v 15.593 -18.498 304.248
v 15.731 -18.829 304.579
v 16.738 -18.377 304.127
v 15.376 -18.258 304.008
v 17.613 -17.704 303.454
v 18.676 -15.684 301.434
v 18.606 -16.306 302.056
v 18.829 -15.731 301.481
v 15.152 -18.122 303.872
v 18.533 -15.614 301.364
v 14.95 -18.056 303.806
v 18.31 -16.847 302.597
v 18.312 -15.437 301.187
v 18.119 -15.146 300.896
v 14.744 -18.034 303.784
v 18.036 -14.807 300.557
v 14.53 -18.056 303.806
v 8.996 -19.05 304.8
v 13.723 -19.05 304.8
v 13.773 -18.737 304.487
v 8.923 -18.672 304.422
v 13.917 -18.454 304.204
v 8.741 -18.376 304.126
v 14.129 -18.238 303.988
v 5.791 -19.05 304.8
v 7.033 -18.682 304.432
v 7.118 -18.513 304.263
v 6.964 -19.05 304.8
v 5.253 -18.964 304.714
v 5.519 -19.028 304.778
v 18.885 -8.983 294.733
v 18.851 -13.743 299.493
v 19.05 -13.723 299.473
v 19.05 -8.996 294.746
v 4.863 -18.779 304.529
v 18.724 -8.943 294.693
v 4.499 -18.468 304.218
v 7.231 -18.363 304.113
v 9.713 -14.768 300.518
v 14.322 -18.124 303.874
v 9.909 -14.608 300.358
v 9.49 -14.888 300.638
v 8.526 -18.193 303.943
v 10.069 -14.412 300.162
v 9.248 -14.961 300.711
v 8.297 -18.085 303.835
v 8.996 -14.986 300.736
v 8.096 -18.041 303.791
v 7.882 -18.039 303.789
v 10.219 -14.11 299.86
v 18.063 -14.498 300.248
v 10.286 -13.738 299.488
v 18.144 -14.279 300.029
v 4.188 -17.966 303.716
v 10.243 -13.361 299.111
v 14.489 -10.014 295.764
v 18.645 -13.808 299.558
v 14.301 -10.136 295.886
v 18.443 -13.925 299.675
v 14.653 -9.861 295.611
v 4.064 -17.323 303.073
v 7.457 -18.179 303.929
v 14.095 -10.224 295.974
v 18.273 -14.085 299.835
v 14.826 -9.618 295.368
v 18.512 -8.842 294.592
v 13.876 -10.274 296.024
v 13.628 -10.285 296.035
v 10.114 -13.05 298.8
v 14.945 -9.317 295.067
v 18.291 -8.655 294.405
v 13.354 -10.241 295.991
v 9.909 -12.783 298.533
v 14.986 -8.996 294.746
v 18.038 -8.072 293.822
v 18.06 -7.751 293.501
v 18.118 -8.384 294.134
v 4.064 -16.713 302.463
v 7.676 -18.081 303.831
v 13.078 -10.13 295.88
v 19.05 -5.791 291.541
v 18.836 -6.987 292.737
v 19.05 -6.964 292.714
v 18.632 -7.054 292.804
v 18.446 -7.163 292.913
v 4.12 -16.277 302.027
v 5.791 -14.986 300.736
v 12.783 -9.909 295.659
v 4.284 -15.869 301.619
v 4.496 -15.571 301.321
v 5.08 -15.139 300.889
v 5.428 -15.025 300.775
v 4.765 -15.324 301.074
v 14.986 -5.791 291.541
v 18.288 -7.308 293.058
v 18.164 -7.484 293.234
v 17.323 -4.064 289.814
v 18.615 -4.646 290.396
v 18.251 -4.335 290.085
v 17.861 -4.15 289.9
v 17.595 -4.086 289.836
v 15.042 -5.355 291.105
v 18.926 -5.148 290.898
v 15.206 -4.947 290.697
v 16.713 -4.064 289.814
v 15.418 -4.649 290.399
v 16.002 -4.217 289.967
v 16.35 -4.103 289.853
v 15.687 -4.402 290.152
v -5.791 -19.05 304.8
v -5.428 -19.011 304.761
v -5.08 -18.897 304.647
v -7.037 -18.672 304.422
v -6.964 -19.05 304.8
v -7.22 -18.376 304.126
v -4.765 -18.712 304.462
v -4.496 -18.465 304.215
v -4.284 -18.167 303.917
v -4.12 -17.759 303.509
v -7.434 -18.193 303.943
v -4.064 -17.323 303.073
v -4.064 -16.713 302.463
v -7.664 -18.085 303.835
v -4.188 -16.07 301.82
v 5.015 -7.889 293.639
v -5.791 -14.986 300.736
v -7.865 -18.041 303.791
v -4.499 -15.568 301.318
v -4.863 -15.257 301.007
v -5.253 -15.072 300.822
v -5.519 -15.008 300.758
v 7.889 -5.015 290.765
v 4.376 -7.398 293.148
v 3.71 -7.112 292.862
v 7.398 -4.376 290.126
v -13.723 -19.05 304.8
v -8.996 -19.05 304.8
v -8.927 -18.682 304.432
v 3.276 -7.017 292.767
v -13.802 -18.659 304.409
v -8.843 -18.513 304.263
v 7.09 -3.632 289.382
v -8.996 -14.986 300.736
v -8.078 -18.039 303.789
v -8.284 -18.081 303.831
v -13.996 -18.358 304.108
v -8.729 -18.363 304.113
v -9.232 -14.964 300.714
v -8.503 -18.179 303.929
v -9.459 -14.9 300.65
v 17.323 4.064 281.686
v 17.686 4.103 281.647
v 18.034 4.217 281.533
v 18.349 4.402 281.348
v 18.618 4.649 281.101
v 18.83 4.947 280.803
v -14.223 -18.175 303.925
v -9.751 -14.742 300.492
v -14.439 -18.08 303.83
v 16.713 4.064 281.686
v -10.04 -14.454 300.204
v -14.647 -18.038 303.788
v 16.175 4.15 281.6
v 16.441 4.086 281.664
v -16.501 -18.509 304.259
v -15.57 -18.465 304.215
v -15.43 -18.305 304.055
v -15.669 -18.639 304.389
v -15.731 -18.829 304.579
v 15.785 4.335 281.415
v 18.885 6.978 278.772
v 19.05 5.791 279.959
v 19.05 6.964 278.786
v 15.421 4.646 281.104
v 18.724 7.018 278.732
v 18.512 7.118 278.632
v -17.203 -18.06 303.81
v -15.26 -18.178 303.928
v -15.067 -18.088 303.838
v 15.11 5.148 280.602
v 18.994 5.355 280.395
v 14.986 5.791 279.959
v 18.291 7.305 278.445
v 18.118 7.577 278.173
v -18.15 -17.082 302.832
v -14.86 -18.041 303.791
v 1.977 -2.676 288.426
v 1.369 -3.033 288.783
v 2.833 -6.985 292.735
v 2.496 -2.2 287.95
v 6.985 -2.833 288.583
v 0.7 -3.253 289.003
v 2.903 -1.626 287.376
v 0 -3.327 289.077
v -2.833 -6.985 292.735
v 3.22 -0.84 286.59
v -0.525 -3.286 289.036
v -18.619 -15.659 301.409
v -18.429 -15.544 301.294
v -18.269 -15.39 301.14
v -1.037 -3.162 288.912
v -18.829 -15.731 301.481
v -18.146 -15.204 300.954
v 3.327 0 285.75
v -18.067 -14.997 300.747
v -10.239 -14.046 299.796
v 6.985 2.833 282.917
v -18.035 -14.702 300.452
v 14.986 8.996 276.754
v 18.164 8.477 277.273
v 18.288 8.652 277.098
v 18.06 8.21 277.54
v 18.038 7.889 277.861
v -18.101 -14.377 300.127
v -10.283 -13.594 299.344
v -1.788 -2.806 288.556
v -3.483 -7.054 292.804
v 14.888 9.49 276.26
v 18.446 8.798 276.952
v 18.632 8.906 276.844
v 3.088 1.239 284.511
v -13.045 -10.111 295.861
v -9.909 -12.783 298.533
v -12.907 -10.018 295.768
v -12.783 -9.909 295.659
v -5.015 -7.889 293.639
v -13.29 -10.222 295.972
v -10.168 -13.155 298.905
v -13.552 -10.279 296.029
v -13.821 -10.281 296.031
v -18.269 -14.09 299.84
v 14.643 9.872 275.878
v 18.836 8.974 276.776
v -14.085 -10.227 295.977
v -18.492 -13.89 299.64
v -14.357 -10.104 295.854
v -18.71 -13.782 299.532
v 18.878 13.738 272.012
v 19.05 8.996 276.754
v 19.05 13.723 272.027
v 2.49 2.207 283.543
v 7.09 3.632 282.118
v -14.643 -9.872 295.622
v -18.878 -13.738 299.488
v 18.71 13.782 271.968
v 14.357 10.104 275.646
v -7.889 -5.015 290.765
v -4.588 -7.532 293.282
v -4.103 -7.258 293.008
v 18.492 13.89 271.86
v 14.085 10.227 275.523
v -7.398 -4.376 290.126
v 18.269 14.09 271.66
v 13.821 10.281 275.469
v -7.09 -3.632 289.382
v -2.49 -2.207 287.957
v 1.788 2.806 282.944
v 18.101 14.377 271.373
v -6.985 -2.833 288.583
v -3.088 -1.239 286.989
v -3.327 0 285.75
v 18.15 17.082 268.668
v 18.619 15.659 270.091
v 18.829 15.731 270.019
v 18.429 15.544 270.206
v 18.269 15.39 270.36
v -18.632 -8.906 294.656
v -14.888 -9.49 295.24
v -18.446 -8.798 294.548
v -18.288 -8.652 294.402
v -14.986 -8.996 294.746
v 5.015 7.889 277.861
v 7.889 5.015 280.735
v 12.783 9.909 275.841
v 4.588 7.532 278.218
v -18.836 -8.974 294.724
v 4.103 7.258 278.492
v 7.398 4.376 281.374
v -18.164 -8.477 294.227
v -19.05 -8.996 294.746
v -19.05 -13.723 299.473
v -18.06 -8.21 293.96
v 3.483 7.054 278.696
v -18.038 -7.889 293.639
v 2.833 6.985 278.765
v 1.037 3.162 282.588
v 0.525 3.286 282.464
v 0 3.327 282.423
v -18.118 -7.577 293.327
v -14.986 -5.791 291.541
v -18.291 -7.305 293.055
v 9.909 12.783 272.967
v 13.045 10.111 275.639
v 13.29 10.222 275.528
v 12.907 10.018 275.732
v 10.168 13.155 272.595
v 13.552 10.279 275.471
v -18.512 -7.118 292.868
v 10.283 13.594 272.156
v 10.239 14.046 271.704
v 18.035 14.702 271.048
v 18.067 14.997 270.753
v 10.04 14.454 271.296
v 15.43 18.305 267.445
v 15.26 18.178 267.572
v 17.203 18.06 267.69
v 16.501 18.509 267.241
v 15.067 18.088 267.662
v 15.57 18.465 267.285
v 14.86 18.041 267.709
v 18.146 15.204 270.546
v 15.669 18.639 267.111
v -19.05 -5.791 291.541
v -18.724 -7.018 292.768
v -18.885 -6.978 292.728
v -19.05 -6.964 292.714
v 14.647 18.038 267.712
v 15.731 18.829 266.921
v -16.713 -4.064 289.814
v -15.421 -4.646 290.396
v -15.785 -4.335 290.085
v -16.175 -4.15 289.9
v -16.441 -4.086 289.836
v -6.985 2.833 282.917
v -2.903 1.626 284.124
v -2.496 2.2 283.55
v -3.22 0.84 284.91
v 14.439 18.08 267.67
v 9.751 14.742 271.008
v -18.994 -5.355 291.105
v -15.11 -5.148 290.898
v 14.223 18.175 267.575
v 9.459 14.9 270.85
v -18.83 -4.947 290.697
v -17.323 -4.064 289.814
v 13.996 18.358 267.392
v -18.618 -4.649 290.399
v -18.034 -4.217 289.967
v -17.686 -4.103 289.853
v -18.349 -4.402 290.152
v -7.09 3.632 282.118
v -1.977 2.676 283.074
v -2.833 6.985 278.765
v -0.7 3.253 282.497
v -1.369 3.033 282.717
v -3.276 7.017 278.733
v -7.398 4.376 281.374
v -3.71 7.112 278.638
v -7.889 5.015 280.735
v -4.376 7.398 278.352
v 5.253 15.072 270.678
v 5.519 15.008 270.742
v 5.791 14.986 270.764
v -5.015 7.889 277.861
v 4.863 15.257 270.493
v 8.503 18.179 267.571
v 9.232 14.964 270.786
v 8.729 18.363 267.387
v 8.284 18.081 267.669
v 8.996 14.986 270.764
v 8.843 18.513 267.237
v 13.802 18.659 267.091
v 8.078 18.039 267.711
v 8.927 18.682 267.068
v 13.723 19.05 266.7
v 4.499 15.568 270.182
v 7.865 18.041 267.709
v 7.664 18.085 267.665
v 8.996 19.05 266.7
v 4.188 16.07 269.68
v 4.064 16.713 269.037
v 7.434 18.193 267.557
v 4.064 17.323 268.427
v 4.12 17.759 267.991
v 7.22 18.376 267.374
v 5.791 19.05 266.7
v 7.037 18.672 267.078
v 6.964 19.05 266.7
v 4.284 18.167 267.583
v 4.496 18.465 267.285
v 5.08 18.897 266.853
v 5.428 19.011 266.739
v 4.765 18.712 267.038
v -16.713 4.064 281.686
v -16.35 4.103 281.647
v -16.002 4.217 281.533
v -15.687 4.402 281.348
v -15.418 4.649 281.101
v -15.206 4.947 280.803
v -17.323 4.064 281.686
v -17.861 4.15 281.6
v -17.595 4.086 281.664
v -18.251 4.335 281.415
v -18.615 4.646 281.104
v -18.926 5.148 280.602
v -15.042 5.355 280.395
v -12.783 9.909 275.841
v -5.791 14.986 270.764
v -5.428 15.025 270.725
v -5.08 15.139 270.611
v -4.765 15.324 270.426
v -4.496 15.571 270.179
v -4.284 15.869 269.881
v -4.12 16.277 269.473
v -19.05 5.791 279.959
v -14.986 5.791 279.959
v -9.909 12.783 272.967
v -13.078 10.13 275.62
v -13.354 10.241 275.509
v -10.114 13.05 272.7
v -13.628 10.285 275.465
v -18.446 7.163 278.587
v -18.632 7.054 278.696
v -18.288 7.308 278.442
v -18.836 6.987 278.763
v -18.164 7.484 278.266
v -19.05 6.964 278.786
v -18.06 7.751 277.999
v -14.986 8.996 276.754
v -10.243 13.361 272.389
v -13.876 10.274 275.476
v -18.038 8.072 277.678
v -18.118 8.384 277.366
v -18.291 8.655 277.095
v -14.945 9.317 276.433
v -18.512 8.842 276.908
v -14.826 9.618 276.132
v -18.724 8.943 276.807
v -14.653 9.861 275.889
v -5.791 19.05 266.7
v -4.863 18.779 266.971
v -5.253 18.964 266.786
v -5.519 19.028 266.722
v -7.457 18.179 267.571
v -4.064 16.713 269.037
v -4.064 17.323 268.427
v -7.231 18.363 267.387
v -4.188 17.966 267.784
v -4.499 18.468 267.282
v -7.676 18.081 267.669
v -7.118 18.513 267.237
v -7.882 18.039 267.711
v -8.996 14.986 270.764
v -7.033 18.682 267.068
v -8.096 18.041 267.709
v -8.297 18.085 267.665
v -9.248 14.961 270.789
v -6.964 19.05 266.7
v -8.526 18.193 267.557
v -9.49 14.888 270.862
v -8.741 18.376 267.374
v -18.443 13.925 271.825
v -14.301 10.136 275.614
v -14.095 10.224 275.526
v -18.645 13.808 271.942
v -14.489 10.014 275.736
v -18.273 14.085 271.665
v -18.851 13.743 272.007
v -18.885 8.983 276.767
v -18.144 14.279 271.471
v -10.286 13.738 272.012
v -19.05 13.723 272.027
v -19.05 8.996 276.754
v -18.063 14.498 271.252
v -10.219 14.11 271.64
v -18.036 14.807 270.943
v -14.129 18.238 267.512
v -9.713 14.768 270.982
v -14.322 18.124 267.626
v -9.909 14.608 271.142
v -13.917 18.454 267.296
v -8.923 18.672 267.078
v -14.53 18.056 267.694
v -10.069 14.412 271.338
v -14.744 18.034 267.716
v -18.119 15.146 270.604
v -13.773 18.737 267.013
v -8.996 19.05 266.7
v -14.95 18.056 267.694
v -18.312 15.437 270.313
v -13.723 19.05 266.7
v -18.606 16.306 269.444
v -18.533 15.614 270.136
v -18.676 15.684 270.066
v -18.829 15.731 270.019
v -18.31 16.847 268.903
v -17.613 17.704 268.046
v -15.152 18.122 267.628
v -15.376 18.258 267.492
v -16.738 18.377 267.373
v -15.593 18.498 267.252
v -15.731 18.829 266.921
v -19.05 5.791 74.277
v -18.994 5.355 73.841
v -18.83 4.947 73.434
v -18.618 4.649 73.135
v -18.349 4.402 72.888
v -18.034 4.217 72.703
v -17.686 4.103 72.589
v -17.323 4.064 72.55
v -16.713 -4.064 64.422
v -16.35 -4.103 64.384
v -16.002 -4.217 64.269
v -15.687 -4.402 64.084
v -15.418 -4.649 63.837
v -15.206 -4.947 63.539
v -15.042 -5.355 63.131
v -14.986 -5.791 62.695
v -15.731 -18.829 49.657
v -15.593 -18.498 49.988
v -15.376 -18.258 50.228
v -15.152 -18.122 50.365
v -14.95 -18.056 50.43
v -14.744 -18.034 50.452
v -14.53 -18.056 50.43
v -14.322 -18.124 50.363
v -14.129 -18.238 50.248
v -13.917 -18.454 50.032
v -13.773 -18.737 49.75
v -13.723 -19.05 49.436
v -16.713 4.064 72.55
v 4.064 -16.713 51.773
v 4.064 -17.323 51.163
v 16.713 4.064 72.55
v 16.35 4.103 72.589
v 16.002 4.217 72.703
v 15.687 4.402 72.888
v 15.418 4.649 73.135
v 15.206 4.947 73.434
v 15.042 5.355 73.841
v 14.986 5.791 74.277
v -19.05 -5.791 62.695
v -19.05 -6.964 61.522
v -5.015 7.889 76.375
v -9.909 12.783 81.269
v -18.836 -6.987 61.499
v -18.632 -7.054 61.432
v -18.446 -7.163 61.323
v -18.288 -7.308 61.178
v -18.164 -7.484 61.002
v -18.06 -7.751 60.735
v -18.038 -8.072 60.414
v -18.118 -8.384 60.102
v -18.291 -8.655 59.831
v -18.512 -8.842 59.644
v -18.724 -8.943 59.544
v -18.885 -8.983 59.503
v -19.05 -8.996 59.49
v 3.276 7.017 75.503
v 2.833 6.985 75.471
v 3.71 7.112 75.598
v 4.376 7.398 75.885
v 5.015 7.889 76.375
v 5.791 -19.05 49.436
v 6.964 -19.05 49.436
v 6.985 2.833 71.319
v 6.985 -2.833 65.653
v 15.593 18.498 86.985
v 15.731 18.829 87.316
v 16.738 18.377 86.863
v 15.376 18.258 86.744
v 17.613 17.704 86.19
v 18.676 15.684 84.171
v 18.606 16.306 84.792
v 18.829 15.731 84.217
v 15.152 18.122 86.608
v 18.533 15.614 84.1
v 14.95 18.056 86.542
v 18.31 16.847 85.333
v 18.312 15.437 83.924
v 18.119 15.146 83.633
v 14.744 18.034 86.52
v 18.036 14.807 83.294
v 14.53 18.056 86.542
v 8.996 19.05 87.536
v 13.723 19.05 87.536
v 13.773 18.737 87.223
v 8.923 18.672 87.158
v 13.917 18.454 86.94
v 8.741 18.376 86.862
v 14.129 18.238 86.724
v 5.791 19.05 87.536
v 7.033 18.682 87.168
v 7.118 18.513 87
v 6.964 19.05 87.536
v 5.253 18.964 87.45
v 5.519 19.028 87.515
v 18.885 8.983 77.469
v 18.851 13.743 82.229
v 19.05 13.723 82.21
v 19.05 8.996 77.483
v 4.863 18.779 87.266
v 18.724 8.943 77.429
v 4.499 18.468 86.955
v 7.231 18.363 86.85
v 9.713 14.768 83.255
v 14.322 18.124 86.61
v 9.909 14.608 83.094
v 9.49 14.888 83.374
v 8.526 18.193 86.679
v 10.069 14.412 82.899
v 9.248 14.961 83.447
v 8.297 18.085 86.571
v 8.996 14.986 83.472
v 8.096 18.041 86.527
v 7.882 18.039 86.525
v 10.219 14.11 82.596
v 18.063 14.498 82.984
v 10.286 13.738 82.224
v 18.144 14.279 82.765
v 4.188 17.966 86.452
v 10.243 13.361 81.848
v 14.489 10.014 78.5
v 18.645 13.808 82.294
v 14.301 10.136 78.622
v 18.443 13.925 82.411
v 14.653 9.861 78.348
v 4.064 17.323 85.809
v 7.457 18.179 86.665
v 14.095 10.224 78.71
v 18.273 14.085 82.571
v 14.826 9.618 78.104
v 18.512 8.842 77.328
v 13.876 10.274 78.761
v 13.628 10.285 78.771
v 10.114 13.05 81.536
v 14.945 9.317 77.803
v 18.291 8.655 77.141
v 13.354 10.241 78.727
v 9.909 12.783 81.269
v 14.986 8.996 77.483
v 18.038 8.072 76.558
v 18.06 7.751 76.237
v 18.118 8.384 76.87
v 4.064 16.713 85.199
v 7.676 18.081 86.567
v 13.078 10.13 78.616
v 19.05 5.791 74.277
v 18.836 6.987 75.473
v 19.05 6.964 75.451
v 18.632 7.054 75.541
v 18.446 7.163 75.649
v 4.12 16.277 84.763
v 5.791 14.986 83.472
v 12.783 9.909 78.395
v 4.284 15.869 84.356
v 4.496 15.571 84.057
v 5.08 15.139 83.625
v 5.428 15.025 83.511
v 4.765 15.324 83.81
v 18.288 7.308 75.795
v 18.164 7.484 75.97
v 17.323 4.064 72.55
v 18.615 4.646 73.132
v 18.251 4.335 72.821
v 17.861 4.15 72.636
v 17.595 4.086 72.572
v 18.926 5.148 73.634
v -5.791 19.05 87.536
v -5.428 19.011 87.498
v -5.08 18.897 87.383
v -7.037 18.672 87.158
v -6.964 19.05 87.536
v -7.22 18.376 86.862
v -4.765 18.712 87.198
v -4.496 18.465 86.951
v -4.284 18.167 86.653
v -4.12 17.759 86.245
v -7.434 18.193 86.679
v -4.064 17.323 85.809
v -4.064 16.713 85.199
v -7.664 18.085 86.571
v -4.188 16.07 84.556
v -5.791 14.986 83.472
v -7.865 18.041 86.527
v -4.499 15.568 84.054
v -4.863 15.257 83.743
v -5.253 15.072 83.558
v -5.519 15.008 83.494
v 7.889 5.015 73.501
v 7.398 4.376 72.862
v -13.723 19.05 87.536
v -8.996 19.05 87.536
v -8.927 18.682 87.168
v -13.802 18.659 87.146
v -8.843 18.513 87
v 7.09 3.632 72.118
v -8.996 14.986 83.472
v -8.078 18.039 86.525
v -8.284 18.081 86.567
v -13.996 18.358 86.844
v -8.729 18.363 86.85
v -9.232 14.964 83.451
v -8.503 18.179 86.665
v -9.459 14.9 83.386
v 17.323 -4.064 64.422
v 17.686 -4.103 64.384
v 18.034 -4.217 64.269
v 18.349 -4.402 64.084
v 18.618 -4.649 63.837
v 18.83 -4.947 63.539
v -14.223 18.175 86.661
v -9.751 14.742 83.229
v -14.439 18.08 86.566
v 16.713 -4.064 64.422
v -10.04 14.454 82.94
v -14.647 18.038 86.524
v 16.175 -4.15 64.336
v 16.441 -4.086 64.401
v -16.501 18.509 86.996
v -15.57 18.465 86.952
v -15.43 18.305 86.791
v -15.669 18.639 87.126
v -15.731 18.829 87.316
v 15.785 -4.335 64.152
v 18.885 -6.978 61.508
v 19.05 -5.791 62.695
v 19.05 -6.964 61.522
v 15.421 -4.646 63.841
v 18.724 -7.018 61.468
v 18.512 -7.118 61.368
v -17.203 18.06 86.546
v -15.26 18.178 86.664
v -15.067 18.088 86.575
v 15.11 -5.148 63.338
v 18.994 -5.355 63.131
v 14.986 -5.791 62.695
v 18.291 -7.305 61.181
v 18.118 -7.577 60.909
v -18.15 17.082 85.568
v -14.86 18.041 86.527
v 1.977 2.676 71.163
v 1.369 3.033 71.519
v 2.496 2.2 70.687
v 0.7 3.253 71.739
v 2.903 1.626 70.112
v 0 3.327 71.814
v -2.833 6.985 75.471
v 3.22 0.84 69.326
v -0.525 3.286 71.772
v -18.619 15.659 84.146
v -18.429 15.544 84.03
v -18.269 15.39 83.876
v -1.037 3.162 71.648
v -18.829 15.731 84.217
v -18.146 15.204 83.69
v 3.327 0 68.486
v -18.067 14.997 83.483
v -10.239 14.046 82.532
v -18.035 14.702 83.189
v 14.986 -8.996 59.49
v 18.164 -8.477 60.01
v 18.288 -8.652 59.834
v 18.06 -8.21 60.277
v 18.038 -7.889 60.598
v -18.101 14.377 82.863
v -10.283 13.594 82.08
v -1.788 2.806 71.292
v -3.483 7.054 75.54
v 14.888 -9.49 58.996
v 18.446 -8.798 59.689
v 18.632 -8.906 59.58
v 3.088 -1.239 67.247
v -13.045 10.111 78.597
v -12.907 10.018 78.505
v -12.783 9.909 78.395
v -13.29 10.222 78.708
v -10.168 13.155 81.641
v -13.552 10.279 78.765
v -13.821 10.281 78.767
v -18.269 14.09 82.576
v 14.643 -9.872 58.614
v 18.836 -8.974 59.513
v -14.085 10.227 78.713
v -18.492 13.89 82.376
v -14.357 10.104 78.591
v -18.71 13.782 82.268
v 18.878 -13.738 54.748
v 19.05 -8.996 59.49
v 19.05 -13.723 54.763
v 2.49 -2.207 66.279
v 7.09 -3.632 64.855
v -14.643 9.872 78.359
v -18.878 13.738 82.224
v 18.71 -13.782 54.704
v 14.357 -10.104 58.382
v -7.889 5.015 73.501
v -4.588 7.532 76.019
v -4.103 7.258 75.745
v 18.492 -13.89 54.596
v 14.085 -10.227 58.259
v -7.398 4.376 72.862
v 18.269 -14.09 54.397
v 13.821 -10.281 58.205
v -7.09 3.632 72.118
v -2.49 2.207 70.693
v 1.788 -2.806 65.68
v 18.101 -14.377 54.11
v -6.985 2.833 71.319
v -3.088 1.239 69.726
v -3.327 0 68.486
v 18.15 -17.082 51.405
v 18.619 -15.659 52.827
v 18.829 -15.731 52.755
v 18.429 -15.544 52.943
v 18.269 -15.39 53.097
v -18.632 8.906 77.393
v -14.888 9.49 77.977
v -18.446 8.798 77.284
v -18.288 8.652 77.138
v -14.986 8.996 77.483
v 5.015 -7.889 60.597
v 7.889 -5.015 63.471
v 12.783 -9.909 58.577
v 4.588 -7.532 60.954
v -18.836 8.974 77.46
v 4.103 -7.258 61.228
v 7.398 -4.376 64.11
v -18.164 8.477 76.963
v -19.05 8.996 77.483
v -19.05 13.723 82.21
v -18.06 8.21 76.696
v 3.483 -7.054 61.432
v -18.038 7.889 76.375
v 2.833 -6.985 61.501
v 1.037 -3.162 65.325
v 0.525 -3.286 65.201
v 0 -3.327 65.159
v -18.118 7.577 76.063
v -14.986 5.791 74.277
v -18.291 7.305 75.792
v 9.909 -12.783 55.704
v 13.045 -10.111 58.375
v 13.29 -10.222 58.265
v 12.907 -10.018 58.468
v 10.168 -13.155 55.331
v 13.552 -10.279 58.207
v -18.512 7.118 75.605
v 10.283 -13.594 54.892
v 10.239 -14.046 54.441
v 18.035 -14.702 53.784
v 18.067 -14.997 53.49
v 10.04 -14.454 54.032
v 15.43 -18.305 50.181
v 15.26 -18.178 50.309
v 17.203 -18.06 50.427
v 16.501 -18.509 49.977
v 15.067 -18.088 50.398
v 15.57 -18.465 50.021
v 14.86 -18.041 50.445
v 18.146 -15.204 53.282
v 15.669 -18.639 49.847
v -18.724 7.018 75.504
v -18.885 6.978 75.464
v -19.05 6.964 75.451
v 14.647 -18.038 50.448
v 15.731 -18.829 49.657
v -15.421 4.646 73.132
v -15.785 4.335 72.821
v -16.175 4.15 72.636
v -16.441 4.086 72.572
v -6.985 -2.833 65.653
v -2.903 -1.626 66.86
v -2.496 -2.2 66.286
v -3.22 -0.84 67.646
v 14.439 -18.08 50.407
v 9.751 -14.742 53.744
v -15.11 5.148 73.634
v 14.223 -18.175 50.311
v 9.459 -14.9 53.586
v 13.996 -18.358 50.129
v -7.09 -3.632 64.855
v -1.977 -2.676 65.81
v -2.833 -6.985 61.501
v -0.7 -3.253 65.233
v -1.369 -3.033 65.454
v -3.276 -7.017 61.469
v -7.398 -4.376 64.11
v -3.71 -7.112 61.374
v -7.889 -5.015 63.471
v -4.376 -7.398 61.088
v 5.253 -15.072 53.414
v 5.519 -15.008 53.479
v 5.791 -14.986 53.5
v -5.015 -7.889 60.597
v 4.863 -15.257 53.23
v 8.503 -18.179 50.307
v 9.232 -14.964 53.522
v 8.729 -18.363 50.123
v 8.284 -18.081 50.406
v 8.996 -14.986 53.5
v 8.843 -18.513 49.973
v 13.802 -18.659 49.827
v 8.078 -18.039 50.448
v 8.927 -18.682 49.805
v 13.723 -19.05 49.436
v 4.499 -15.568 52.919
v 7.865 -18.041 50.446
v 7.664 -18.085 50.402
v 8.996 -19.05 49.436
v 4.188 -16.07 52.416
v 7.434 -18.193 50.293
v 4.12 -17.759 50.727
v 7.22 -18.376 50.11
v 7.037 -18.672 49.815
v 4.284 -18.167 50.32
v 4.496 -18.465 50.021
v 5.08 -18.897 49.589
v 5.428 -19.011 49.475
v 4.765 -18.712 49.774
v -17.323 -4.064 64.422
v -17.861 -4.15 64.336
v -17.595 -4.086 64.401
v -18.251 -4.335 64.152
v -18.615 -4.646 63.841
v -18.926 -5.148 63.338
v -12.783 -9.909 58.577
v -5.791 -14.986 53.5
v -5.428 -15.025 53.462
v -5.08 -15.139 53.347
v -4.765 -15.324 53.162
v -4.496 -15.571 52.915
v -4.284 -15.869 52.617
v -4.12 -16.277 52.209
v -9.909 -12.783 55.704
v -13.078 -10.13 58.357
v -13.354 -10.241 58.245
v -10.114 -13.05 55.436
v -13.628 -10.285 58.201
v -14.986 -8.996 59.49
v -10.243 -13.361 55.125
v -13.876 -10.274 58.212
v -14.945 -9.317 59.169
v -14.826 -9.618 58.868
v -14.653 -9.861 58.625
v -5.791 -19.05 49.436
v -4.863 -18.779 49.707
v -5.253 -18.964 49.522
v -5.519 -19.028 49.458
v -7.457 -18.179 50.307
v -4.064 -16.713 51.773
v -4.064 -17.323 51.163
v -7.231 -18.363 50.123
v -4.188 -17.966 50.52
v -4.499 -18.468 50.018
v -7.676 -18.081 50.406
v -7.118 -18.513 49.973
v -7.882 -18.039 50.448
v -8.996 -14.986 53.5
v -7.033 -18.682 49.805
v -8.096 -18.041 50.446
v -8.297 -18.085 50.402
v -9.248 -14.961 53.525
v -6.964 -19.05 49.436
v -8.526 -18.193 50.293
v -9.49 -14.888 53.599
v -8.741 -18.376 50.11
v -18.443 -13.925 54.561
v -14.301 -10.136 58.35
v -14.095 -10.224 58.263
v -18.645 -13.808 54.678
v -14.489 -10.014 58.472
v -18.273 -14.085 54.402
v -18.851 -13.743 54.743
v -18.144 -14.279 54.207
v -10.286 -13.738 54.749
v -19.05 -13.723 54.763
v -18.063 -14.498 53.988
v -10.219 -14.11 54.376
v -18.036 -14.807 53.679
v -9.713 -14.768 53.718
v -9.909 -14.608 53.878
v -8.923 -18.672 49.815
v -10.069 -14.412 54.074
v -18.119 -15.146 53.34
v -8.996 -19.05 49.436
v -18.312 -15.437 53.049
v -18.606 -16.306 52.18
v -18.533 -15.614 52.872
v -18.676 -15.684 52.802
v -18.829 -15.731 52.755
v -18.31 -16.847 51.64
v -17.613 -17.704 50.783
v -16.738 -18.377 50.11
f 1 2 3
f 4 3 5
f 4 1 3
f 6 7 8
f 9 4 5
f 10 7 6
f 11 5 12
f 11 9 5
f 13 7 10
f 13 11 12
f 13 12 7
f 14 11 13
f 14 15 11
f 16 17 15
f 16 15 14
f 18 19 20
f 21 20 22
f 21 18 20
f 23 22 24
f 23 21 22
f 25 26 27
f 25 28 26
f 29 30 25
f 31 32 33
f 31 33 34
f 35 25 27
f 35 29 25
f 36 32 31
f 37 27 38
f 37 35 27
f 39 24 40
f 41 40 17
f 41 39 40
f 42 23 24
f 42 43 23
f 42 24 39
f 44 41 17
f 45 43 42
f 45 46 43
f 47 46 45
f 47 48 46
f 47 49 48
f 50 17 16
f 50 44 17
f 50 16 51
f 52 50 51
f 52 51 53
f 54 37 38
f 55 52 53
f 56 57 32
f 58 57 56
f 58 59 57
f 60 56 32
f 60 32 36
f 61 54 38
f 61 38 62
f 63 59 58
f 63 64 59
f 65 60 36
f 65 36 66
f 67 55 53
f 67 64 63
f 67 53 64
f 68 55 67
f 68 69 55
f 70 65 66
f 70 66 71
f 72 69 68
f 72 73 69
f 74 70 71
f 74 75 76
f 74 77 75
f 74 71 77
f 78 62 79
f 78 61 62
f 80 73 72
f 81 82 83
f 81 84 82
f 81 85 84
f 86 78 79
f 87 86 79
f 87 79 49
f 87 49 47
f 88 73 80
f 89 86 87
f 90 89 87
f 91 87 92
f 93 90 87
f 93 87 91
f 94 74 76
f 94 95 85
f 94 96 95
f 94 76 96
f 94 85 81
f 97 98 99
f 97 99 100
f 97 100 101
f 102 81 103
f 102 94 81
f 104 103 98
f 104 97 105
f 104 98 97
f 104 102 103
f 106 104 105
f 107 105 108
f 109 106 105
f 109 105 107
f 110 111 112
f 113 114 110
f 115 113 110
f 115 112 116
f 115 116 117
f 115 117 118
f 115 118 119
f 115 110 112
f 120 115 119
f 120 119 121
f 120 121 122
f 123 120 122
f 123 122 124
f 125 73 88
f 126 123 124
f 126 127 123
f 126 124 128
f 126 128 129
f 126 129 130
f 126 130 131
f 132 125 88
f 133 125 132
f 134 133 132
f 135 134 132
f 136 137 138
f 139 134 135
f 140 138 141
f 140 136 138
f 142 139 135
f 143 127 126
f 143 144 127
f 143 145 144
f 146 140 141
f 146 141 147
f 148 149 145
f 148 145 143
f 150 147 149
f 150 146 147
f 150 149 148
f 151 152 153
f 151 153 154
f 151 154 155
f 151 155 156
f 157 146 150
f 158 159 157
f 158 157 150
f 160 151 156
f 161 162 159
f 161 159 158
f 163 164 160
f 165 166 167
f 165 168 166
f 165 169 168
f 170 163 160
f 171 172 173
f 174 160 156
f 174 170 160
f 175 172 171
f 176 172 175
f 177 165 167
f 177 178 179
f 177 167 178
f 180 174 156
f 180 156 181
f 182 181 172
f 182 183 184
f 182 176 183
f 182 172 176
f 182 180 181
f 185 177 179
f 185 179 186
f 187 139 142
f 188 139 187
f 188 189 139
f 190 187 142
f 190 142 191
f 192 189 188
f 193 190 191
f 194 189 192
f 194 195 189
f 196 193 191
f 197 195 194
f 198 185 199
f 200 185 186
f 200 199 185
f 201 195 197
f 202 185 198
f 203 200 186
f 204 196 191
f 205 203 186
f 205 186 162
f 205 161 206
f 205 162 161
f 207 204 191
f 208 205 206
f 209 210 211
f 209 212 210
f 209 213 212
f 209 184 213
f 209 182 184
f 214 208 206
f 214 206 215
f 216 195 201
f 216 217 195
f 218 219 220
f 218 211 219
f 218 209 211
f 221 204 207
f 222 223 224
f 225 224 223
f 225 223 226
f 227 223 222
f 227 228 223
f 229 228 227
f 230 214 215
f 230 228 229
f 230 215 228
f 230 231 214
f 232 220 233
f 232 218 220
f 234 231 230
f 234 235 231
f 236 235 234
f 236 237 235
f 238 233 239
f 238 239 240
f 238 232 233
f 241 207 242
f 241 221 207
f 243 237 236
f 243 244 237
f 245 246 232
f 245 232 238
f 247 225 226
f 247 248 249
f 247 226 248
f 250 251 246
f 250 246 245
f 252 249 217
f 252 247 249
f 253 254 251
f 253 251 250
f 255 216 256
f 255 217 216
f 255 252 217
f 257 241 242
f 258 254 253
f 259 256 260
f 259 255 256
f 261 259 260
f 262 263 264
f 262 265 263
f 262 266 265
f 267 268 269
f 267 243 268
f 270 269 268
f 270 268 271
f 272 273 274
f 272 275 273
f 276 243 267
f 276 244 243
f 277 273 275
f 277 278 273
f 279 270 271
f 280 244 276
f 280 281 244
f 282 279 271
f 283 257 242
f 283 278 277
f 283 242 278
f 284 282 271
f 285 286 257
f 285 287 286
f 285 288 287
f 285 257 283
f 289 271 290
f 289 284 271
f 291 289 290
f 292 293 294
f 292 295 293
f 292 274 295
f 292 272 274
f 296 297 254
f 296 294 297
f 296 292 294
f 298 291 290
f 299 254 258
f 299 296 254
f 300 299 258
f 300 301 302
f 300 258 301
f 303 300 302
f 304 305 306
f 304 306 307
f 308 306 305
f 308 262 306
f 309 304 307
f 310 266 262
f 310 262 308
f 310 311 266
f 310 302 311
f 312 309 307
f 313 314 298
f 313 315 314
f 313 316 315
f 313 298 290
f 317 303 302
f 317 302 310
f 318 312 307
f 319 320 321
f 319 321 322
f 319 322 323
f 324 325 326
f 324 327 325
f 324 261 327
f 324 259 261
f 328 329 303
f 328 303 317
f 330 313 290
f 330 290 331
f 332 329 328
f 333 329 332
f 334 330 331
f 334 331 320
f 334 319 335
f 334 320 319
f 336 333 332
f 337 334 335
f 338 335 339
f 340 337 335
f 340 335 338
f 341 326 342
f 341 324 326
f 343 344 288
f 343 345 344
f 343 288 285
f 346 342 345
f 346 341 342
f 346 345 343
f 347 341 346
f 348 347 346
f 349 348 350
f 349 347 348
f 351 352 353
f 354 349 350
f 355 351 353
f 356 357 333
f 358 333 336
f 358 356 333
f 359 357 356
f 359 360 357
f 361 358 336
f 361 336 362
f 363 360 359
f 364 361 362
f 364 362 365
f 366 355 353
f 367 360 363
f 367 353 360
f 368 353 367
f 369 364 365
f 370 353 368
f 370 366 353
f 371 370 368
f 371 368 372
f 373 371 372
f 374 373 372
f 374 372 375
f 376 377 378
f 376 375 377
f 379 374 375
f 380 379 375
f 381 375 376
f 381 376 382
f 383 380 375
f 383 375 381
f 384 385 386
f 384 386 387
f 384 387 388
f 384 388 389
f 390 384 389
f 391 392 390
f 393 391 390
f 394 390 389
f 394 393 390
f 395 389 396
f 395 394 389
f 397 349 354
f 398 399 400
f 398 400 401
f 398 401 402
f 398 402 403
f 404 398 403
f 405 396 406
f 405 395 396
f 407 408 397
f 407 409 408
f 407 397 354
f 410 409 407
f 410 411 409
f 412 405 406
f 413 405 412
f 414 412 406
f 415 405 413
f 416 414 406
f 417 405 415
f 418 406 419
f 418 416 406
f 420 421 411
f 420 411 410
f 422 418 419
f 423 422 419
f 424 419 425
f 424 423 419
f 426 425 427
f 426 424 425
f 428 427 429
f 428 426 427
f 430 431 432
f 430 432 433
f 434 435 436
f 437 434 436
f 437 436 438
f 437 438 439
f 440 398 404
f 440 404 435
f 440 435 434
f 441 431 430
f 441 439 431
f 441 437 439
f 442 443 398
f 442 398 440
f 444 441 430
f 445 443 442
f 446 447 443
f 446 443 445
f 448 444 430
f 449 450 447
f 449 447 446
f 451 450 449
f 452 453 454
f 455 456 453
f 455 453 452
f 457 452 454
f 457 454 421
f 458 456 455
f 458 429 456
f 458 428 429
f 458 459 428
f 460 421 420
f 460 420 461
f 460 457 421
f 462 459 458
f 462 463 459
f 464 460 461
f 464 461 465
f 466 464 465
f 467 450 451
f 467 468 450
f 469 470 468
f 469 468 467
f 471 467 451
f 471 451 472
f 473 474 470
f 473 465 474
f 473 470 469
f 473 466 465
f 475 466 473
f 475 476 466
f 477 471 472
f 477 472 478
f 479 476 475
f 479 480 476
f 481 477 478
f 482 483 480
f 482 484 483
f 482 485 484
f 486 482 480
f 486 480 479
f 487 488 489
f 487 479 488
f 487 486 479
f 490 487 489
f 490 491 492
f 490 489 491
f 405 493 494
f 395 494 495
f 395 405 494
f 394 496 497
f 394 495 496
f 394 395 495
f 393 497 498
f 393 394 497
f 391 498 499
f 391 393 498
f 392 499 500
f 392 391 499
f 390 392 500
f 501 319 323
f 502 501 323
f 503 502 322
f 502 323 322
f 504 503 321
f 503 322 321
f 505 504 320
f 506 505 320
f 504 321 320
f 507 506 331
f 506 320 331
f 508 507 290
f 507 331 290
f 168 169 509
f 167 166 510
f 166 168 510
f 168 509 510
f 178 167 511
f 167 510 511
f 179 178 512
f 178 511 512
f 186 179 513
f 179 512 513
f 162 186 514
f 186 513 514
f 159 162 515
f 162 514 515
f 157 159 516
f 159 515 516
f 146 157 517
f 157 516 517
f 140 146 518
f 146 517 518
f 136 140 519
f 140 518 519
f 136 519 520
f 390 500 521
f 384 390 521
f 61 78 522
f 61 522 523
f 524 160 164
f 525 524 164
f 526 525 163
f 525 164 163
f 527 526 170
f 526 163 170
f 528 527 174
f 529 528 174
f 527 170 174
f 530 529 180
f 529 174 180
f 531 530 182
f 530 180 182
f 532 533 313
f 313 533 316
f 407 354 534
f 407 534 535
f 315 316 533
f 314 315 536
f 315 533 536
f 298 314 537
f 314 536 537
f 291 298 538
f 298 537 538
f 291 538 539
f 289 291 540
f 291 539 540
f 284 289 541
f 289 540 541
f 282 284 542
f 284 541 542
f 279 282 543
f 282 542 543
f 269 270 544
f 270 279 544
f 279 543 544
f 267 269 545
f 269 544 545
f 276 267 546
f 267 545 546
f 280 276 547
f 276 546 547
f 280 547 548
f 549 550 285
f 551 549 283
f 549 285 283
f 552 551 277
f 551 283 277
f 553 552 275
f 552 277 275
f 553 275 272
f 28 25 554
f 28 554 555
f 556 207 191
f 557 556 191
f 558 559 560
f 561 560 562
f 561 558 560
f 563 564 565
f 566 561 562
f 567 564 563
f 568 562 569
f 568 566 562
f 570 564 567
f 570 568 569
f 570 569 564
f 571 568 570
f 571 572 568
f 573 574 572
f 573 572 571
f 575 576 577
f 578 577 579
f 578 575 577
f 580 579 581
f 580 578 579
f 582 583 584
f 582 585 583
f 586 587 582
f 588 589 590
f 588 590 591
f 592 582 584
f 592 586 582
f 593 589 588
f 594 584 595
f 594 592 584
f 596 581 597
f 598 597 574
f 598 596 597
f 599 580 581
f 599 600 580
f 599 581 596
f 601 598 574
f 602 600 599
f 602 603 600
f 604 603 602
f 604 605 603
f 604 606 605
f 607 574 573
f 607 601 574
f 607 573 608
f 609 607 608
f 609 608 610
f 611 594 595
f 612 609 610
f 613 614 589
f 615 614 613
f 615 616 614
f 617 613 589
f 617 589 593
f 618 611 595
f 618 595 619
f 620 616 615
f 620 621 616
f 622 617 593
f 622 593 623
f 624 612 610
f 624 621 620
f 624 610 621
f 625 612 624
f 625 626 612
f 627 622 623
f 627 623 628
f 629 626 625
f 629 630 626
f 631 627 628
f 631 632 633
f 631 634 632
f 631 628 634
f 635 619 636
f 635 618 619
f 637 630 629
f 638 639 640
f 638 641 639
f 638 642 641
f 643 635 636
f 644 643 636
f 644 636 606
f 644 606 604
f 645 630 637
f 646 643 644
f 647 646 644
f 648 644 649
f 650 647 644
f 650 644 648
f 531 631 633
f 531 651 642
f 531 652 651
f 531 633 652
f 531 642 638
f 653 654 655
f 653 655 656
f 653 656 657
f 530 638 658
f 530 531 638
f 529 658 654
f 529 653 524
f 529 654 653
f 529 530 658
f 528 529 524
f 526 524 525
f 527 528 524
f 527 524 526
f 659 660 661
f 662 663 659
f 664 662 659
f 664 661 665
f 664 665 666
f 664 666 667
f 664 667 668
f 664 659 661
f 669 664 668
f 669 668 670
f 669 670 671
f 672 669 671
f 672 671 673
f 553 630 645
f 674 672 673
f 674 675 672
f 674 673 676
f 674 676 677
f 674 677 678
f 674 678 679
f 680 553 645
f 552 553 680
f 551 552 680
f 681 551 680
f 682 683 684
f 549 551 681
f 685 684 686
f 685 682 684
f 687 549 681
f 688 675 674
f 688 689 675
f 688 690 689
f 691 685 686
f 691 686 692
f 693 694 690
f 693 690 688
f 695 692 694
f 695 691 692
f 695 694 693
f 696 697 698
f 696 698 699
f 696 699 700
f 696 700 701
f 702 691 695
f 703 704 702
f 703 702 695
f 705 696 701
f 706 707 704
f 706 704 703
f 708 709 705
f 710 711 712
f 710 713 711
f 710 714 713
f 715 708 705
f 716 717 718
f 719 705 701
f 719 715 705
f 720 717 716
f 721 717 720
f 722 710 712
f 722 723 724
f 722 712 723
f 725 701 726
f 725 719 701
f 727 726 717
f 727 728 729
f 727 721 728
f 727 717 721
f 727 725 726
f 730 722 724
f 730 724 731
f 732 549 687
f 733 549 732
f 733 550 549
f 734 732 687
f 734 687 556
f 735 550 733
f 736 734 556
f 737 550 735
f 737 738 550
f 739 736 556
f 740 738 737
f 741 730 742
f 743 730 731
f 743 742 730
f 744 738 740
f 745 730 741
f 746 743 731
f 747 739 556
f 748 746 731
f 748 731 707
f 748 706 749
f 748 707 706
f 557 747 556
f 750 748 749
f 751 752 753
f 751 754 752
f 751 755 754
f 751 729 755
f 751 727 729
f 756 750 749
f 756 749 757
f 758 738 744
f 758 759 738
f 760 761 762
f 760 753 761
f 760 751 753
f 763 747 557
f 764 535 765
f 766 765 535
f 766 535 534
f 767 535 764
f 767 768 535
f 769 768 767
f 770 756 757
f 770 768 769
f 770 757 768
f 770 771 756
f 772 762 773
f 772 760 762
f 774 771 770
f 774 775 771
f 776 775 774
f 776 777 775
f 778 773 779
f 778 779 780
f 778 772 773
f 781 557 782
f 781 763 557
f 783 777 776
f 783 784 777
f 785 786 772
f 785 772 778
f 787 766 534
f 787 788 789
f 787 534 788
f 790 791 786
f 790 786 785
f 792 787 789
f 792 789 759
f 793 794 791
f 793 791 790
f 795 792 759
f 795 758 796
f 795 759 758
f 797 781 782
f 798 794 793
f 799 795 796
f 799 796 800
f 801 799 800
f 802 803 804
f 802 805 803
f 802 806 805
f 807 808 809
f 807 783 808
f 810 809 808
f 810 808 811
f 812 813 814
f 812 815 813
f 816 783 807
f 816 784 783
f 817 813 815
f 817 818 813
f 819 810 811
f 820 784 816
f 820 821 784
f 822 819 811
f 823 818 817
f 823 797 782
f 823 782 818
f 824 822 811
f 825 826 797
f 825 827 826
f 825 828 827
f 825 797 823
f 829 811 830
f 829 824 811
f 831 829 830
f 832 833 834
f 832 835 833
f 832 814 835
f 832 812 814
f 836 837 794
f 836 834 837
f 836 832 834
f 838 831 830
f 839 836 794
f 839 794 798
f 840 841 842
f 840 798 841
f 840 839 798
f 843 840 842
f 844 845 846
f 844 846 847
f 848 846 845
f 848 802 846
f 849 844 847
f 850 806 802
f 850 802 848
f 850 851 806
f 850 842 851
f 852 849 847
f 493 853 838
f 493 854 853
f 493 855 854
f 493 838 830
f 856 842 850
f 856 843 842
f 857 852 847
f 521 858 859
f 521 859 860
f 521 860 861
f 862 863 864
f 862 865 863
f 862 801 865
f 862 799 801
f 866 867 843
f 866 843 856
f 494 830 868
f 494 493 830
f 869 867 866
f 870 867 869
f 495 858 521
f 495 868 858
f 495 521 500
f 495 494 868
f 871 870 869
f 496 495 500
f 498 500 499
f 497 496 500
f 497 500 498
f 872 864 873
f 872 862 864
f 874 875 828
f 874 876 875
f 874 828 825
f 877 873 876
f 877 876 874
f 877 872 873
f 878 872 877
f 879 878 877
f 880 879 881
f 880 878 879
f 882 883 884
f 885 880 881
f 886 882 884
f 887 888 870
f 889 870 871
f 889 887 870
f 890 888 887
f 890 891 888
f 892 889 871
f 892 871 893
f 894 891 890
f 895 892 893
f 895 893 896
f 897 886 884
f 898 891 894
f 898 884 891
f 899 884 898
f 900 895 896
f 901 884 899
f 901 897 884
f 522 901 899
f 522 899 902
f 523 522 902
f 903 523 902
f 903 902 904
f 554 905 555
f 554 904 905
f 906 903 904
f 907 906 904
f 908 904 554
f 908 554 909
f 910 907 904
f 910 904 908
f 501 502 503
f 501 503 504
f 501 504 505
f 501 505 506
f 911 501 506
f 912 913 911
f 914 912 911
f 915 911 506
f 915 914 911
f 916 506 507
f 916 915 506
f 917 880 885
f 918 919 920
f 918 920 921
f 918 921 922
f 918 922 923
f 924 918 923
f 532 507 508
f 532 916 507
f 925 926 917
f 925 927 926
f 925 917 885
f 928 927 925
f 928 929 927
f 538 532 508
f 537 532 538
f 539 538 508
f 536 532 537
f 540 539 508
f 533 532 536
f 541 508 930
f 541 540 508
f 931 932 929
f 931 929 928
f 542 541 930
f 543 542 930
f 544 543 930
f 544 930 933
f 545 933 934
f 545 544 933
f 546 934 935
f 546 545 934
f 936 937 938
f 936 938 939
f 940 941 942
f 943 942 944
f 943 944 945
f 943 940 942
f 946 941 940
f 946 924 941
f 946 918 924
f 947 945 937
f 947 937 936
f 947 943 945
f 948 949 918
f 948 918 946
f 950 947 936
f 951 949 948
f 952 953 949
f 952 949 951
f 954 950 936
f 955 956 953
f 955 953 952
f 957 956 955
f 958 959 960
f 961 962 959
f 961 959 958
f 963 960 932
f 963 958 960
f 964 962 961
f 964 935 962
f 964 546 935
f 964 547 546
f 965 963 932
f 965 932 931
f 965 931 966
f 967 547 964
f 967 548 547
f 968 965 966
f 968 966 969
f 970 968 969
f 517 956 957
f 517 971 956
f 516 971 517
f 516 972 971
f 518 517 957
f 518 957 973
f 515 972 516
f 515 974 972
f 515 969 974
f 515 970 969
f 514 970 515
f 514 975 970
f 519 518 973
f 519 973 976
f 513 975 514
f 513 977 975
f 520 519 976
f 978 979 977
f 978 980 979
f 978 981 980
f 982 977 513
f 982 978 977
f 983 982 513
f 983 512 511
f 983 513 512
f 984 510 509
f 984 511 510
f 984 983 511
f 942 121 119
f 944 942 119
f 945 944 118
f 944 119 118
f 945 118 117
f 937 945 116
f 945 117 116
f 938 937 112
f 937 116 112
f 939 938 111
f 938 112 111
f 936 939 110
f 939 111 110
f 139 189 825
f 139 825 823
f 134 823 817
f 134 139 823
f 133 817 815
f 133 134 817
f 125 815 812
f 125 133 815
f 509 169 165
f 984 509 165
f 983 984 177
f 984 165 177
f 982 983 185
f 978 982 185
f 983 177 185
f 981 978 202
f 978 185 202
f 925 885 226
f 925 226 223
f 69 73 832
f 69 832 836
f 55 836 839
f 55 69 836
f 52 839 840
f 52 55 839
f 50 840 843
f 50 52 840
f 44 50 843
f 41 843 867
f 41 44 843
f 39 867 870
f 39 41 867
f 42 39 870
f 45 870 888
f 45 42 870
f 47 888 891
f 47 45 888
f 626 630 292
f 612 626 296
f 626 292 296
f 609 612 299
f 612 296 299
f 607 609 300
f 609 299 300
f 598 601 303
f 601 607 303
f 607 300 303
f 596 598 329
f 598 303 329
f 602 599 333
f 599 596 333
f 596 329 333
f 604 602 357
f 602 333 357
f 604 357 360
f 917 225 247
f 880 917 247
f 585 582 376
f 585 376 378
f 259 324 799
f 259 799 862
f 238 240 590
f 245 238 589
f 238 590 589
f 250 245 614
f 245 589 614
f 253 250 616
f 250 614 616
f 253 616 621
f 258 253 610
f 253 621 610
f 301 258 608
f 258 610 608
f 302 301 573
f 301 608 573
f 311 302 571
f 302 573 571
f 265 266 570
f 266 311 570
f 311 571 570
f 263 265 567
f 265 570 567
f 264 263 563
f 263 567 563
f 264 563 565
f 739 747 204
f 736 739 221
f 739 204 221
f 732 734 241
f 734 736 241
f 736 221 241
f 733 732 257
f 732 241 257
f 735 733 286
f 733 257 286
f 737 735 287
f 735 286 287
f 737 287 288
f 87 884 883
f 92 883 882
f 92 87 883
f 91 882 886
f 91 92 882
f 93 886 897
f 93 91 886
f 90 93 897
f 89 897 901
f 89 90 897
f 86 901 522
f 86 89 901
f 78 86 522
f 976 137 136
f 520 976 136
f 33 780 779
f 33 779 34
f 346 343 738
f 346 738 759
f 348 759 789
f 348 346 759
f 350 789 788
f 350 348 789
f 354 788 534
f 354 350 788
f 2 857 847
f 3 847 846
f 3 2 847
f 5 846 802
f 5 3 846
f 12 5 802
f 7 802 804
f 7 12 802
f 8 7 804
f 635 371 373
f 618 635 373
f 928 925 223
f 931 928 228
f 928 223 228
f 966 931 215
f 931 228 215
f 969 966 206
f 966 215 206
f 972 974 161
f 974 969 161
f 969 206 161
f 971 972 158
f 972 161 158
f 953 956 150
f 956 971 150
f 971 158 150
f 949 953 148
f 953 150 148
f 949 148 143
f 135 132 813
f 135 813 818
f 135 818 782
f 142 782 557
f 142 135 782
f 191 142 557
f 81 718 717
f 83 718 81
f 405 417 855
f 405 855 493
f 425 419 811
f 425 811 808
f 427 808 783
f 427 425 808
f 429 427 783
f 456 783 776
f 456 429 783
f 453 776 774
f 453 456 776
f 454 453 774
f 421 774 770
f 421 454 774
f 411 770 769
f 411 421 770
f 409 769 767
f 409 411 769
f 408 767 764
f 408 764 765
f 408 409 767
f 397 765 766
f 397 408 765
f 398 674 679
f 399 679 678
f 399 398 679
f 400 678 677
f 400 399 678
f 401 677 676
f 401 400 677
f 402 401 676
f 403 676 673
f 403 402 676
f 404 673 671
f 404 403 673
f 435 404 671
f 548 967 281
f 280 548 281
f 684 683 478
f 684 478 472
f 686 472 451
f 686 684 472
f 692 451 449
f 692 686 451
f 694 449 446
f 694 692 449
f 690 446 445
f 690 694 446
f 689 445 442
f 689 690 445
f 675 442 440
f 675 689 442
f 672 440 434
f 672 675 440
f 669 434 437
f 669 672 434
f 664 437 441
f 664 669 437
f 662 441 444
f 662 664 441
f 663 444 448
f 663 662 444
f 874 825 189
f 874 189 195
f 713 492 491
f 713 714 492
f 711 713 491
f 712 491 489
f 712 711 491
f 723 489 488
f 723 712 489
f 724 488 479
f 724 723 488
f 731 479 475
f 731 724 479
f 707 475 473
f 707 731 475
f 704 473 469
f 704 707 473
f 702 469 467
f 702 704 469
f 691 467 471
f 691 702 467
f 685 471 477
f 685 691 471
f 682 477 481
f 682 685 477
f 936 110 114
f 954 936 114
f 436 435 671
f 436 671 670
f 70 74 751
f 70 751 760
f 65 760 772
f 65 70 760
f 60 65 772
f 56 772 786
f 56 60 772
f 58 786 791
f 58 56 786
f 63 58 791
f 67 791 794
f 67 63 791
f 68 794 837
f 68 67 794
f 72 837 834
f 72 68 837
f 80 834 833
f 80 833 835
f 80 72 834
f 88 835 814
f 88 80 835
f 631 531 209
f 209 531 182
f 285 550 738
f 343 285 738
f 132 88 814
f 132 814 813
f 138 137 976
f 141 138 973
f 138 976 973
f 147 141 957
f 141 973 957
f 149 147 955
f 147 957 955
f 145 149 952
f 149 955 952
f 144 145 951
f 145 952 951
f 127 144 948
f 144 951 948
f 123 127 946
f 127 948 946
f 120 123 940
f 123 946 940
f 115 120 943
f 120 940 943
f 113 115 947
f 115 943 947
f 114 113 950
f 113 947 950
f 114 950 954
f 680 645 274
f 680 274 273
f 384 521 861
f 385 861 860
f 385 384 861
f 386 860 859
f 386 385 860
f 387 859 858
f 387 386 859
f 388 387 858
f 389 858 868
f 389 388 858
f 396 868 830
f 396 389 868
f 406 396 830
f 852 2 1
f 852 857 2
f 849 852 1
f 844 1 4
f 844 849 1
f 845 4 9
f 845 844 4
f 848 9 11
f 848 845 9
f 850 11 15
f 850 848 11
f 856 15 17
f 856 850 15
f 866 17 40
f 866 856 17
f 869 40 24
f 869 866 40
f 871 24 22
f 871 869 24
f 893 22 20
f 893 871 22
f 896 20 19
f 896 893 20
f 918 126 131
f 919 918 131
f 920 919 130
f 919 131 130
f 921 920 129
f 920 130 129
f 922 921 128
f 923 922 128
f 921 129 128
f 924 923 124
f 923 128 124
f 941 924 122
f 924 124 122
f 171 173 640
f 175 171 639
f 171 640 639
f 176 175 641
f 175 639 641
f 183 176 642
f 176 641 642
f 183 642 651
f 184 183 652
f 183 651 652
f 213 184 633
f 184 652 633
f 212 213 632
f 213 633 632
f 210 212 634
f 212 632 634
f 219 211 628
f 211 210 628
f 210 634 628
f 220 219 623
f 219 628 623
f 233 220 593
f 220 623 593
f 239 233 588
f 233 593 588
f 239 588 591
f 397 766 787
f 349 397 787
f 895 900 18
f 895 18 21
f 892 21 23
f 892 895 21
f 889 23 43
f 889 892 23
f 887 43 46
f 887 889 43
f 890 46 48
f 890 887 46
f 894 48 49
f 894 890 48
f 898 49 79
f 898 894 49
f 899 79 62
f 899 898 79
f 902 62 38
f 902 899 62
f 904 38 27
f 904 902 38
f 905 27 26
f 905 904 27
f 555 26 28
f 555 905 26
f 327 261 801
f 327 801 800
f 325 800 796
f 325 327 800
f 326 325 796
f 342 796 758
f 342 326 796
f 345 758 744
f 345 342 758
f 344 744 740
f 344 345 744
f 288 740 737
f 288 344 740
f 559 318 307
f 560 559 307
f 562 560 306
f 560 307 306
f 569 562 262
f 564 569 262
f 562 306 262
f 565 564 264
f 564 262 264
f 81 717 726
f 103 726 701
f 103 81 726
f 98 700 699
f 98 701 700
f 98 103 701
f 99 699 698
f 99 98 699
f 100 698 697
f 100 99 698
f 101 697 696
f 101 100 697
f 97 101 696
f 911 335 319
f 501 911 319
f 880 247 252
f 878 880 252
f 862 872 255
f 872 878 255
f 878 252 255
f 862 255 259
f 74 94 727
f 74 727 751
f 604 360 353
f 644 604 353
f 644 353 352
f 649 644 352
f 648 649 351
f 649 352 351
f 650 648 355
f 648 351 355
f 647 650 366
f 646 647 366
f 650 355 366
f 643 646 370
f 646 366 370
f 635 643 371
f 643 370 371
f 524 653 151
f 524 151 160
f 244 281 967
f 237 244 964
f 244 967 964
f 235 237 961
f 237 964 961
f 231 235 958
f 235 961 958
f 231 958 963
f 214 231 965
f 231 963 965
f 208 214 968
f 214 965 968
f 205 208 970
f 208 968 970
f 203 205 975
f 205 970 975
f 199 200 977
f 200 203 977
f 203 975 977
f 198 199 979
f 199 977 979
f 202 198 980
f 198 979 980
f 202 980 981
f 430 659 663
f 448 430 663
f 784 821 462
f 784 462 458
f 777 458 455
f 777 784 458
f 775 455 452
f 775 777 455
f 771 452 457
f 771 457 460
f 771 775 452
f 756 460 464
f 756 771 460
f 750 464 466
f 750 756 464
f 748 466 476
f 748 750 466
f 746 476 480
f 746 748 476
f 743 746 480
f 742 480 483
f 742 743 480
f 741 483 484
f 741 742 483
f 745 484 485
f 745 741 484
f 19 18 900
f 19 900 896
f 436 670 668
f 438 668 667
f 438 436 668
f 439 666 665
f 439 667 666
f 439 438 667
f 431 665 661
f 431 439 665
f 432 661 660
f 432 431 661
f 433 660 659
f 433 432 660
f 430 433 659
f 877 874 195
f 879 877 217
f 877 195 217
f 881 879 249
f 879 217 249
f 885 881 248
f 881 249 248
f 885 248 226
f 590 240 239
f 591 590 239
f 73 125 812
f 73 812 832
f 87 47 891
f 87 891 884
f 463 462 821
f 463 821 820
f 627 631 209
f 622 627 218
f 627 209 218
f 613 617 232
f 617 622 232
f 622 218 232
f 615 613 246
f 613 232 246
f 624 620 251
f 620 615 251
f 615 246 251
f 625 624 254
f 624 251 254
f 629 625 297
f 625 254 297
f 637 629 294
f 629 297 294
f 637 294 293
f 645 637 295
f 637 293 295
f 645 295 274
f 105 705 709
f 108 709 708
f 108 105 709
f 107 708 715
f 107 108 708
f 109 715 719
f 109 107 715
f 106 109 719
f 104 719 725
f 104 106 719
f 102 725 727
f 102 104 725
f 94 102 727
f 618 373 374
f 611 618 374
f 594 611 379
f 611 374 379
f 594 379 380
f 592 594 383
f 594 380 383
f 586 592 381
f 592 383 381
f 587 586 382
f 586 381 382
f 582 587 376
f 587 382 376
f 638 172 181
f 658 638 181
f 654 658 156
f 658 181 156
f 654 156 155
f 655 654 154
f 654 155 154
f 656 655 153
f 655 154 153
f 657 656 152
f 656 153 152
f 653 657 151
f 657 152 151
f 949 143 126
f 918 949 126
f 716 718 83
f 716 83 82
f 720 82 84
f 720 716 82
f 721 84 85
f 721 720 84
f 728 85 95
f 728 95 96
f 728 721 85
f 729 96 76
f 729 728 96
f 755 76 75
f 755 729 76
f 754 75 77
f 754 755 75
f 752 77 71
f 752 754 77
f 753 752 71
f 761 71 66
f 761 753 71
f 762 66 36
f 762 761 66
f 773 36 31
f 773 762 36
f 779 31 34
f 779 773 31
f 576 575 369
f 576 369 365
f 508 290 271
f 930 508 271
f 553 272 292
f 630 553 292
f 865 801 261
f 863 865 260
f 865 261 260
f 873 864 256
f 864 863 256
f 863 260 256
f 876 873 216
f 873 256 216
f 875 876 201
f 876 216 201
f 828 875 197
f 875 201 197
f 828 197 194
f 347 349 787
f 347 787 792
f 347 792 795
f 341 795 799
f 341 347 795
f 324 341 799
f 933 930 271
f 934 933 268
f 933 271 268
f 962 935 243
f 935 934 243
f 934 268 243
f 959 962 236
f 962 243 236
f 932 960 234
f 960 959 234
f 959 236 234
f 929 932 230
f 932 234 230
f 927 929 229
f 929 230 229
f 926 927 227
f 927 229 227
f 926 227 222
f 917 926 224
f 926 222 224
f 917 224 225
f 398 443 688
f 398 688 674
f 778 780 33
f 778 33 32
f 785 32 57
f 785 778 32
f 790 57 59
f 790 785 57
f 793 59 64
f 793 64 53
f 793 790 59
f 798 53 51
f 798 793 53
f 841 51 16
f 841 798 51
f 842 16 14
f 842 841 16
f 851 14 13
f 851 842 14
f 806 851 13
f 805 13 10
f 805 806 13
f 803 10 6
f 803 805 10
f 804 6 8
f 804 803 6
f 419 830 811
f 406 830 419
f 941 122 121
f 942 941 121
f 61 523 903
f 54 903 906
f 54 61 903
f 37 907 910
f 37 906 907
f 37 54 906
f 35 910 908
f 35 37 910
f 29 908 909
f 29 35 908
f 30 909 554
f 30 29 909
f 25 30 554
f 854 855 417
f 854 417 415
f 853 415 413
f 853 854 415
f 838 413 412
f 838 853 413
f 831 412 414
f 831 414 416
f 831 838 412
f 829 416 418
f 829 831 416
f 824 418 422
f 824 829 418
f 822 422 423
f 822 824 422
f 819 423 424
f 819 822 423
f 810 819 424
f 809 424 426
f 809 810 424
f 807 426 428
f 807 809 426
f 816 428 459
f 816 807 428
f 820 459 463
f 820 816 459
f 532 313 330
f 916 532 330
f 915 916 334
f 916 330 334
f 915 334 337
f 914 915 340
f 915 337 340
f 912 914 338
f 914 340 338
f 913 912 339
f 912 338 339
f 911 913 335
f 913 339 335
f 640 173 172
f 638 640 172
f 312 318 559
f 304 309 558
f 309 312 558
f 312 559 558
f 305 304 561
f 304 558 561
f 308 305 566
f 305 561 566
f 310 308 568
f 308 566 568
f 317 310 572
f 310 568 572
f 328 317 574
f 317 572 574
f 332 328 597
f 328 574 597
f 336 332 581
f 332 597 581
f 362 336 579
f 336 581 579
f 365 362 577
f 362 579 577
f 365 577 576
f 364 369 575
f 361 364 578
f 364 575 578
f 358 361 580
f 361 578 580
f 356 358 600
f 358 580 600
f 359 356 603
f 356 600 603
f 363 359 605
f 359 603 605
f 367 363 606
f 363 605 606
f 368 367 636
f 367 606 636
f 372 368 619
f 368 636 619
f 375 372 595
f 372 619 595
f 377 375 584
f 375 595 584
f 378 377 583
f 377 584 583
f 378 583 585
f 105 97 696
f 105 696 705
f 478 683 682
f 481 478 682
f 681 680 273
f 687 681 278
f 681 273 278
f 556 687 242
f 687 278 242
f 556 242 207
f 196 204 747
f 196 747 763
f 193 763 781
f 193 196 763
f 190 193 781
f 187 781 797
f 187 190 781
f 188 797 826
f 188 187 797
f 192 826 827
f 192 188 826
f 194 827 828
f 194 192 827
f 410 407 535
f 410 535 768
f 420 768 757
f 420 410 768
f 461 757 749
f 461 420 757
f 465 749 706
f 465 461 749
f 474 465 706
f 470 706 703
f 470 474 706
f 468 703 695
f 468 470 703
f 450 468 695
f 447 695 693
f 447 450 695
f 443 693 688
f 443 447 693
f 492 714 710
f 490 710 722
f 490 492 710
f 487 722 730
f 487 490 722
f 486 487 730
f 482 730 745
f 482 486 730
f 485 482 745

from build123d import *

# Parameters (mm, degrees)
BOSS_EXTRUDE1_DEPTH     = 304.8
CUT_EXTRUDE1_DEPTH      = 306.9883086
CUT_EXTRUDE1_DEPTH_BACK = 306.9883086
SKETCH5_R               = 1.016
CUT_EXTRUDE2_DEPTH      = 306.9883086
CUT_EXTRUDE2_DEPTH_BACK = 306.9883086


with BuildPart() as part:
    # Sketch4 → Boss-Extrude1 (new, symmetric)
    with BuildSketch(Plane.XY):
        with BuildLine():
            Line((5.7912, -19.05), (14.3002, -19.05))
            ThreePointArc((14.3002, -19.05), (17.658815789, -17.658815789), (19.05, -14.3002))
            Line((19.05, -14.3002), (19.05, -5.7912))
            ThreePointArc((19.05, -5.7912), (18.544114832, -4.569885168), (17.3228, -4.064))
            Line((17.3228, -4.064), (16.7132, -4.064))
            ThreePointArc((16.7132, -4.064), (15.491885168, -4.569885168), (14.986, -5.7912))
            Line((14.986, -5.7912), (14.986, -8.996305235))
            ThreePointArc((14.986, -8.996305235), (14.189232738, -10.188751711), (12.782646215, -9.908964256))
            Line((12.782646215, -9.908964256), (7.888897763, -5.015215804))
            ThreePointArc((7.888897763, -5.015215804), (7.219915375, -4.014012907), (6.985, -2.833013566))
            Line((6.985, -2.833013566), (6.985, 0))
            Line((6.985, 0), (3.3274, 0))
            ThreePointArc((3.3274, 0), (2.352827104, -2.352827104), (0, -3.3274))
            Line((0, -3.3274), (0, -6.985))
            Line((0, -6.985), (2.833013566, -6.985))
            ThreePointArc((2.833013566, -6.985), (4.014012907, -7.219915375), (5.015215804, -7.888897763))
            Line((5.015215804, -7.888897763), (9.908964256, -12.782646215))
            ThreePointArc((9.908964256, -12.782646215), (10.188751711, -14.189232738), (8.996305235, -14.986))
            Line((8.996305235, -14.986), (5.7912, -14.986))
            ThreePointArc((5.7912, -14.986), (4.569885168, -15.491885168), (4.064, -16.7132))
            Line((4.064, -16.7132), (4.064, -17.3228))
            ThreePointArc((4.064, -17.3228), (4.569885168, -18.544114832), (5.7912, -19.05))
        make_face()
    extrude(amount=BOSS_EXTRUDE1_DEPTH, both=True)

    # Sketch5 → Cut-Extrude1 (cut, two sides: drawn at the far end of the back side and taken through both)
    with BuildSketch(Plane.XY.offset(-CUT_EXTRUDE1_DEPTH_BACK)):
        with Locations((14.739477062, -19.05)):
            Circle(SKETCH5_R)
        with Locations((7.980305235, -19.05)):
            Circle(SKETCH5_R)
        with Locations((19.05, -14.739477062)):
            Circle(SKETCH5_R)
        with Locations((19.05, -7.980305235)):
            Circle(SKETCH5_R)
    extrude(amount=CUT_EXTRUDE1_DEPTH + CUT_EXTRUDE1_DEPTH_BACK, mode=Mode.SUBTRACT)

    # Mirror1: part across plane


with BuildPart() as part_1:
    add(part.part)
    add(part.part.mirror(Plane(origin=(0, 0, 0), x_dir=(0, 0, 1), z_dir=(1, 0, 0))))

    # Mirror2: part across plane


with BuildPart() as part_2:
    add(part_1.part)
    add(part_1.part.mirror(Plane.ZX))

    # Sketch6 → Cut-Extrude2 (cut, two sides: drawn at the far end of the back side and taken through both)
    with BuildSketch(Plane(origin=(0, 0, 0), x_dir=(0, 0, -1), z_dir=(1, 0, 0)).offset(-CUT_EXTRUDE2_DEPTH_BACK)):
        Polygon((-266.7, 19.05), (-304.8, 19.05), (-304.8, -19.05), align=None)
        Polygon((-87.536268412, 19.05), (-49.436268412, -19.05), (304.8, -19.05), (304.8, 19.05), align=None)
    extrude(amount=CUT_EXTRUDE2_DEPTH + CUT_EXTRUDE2_DEPTH_BACK, mode=Mode.SUBTRACT)


solid = part_2.part
